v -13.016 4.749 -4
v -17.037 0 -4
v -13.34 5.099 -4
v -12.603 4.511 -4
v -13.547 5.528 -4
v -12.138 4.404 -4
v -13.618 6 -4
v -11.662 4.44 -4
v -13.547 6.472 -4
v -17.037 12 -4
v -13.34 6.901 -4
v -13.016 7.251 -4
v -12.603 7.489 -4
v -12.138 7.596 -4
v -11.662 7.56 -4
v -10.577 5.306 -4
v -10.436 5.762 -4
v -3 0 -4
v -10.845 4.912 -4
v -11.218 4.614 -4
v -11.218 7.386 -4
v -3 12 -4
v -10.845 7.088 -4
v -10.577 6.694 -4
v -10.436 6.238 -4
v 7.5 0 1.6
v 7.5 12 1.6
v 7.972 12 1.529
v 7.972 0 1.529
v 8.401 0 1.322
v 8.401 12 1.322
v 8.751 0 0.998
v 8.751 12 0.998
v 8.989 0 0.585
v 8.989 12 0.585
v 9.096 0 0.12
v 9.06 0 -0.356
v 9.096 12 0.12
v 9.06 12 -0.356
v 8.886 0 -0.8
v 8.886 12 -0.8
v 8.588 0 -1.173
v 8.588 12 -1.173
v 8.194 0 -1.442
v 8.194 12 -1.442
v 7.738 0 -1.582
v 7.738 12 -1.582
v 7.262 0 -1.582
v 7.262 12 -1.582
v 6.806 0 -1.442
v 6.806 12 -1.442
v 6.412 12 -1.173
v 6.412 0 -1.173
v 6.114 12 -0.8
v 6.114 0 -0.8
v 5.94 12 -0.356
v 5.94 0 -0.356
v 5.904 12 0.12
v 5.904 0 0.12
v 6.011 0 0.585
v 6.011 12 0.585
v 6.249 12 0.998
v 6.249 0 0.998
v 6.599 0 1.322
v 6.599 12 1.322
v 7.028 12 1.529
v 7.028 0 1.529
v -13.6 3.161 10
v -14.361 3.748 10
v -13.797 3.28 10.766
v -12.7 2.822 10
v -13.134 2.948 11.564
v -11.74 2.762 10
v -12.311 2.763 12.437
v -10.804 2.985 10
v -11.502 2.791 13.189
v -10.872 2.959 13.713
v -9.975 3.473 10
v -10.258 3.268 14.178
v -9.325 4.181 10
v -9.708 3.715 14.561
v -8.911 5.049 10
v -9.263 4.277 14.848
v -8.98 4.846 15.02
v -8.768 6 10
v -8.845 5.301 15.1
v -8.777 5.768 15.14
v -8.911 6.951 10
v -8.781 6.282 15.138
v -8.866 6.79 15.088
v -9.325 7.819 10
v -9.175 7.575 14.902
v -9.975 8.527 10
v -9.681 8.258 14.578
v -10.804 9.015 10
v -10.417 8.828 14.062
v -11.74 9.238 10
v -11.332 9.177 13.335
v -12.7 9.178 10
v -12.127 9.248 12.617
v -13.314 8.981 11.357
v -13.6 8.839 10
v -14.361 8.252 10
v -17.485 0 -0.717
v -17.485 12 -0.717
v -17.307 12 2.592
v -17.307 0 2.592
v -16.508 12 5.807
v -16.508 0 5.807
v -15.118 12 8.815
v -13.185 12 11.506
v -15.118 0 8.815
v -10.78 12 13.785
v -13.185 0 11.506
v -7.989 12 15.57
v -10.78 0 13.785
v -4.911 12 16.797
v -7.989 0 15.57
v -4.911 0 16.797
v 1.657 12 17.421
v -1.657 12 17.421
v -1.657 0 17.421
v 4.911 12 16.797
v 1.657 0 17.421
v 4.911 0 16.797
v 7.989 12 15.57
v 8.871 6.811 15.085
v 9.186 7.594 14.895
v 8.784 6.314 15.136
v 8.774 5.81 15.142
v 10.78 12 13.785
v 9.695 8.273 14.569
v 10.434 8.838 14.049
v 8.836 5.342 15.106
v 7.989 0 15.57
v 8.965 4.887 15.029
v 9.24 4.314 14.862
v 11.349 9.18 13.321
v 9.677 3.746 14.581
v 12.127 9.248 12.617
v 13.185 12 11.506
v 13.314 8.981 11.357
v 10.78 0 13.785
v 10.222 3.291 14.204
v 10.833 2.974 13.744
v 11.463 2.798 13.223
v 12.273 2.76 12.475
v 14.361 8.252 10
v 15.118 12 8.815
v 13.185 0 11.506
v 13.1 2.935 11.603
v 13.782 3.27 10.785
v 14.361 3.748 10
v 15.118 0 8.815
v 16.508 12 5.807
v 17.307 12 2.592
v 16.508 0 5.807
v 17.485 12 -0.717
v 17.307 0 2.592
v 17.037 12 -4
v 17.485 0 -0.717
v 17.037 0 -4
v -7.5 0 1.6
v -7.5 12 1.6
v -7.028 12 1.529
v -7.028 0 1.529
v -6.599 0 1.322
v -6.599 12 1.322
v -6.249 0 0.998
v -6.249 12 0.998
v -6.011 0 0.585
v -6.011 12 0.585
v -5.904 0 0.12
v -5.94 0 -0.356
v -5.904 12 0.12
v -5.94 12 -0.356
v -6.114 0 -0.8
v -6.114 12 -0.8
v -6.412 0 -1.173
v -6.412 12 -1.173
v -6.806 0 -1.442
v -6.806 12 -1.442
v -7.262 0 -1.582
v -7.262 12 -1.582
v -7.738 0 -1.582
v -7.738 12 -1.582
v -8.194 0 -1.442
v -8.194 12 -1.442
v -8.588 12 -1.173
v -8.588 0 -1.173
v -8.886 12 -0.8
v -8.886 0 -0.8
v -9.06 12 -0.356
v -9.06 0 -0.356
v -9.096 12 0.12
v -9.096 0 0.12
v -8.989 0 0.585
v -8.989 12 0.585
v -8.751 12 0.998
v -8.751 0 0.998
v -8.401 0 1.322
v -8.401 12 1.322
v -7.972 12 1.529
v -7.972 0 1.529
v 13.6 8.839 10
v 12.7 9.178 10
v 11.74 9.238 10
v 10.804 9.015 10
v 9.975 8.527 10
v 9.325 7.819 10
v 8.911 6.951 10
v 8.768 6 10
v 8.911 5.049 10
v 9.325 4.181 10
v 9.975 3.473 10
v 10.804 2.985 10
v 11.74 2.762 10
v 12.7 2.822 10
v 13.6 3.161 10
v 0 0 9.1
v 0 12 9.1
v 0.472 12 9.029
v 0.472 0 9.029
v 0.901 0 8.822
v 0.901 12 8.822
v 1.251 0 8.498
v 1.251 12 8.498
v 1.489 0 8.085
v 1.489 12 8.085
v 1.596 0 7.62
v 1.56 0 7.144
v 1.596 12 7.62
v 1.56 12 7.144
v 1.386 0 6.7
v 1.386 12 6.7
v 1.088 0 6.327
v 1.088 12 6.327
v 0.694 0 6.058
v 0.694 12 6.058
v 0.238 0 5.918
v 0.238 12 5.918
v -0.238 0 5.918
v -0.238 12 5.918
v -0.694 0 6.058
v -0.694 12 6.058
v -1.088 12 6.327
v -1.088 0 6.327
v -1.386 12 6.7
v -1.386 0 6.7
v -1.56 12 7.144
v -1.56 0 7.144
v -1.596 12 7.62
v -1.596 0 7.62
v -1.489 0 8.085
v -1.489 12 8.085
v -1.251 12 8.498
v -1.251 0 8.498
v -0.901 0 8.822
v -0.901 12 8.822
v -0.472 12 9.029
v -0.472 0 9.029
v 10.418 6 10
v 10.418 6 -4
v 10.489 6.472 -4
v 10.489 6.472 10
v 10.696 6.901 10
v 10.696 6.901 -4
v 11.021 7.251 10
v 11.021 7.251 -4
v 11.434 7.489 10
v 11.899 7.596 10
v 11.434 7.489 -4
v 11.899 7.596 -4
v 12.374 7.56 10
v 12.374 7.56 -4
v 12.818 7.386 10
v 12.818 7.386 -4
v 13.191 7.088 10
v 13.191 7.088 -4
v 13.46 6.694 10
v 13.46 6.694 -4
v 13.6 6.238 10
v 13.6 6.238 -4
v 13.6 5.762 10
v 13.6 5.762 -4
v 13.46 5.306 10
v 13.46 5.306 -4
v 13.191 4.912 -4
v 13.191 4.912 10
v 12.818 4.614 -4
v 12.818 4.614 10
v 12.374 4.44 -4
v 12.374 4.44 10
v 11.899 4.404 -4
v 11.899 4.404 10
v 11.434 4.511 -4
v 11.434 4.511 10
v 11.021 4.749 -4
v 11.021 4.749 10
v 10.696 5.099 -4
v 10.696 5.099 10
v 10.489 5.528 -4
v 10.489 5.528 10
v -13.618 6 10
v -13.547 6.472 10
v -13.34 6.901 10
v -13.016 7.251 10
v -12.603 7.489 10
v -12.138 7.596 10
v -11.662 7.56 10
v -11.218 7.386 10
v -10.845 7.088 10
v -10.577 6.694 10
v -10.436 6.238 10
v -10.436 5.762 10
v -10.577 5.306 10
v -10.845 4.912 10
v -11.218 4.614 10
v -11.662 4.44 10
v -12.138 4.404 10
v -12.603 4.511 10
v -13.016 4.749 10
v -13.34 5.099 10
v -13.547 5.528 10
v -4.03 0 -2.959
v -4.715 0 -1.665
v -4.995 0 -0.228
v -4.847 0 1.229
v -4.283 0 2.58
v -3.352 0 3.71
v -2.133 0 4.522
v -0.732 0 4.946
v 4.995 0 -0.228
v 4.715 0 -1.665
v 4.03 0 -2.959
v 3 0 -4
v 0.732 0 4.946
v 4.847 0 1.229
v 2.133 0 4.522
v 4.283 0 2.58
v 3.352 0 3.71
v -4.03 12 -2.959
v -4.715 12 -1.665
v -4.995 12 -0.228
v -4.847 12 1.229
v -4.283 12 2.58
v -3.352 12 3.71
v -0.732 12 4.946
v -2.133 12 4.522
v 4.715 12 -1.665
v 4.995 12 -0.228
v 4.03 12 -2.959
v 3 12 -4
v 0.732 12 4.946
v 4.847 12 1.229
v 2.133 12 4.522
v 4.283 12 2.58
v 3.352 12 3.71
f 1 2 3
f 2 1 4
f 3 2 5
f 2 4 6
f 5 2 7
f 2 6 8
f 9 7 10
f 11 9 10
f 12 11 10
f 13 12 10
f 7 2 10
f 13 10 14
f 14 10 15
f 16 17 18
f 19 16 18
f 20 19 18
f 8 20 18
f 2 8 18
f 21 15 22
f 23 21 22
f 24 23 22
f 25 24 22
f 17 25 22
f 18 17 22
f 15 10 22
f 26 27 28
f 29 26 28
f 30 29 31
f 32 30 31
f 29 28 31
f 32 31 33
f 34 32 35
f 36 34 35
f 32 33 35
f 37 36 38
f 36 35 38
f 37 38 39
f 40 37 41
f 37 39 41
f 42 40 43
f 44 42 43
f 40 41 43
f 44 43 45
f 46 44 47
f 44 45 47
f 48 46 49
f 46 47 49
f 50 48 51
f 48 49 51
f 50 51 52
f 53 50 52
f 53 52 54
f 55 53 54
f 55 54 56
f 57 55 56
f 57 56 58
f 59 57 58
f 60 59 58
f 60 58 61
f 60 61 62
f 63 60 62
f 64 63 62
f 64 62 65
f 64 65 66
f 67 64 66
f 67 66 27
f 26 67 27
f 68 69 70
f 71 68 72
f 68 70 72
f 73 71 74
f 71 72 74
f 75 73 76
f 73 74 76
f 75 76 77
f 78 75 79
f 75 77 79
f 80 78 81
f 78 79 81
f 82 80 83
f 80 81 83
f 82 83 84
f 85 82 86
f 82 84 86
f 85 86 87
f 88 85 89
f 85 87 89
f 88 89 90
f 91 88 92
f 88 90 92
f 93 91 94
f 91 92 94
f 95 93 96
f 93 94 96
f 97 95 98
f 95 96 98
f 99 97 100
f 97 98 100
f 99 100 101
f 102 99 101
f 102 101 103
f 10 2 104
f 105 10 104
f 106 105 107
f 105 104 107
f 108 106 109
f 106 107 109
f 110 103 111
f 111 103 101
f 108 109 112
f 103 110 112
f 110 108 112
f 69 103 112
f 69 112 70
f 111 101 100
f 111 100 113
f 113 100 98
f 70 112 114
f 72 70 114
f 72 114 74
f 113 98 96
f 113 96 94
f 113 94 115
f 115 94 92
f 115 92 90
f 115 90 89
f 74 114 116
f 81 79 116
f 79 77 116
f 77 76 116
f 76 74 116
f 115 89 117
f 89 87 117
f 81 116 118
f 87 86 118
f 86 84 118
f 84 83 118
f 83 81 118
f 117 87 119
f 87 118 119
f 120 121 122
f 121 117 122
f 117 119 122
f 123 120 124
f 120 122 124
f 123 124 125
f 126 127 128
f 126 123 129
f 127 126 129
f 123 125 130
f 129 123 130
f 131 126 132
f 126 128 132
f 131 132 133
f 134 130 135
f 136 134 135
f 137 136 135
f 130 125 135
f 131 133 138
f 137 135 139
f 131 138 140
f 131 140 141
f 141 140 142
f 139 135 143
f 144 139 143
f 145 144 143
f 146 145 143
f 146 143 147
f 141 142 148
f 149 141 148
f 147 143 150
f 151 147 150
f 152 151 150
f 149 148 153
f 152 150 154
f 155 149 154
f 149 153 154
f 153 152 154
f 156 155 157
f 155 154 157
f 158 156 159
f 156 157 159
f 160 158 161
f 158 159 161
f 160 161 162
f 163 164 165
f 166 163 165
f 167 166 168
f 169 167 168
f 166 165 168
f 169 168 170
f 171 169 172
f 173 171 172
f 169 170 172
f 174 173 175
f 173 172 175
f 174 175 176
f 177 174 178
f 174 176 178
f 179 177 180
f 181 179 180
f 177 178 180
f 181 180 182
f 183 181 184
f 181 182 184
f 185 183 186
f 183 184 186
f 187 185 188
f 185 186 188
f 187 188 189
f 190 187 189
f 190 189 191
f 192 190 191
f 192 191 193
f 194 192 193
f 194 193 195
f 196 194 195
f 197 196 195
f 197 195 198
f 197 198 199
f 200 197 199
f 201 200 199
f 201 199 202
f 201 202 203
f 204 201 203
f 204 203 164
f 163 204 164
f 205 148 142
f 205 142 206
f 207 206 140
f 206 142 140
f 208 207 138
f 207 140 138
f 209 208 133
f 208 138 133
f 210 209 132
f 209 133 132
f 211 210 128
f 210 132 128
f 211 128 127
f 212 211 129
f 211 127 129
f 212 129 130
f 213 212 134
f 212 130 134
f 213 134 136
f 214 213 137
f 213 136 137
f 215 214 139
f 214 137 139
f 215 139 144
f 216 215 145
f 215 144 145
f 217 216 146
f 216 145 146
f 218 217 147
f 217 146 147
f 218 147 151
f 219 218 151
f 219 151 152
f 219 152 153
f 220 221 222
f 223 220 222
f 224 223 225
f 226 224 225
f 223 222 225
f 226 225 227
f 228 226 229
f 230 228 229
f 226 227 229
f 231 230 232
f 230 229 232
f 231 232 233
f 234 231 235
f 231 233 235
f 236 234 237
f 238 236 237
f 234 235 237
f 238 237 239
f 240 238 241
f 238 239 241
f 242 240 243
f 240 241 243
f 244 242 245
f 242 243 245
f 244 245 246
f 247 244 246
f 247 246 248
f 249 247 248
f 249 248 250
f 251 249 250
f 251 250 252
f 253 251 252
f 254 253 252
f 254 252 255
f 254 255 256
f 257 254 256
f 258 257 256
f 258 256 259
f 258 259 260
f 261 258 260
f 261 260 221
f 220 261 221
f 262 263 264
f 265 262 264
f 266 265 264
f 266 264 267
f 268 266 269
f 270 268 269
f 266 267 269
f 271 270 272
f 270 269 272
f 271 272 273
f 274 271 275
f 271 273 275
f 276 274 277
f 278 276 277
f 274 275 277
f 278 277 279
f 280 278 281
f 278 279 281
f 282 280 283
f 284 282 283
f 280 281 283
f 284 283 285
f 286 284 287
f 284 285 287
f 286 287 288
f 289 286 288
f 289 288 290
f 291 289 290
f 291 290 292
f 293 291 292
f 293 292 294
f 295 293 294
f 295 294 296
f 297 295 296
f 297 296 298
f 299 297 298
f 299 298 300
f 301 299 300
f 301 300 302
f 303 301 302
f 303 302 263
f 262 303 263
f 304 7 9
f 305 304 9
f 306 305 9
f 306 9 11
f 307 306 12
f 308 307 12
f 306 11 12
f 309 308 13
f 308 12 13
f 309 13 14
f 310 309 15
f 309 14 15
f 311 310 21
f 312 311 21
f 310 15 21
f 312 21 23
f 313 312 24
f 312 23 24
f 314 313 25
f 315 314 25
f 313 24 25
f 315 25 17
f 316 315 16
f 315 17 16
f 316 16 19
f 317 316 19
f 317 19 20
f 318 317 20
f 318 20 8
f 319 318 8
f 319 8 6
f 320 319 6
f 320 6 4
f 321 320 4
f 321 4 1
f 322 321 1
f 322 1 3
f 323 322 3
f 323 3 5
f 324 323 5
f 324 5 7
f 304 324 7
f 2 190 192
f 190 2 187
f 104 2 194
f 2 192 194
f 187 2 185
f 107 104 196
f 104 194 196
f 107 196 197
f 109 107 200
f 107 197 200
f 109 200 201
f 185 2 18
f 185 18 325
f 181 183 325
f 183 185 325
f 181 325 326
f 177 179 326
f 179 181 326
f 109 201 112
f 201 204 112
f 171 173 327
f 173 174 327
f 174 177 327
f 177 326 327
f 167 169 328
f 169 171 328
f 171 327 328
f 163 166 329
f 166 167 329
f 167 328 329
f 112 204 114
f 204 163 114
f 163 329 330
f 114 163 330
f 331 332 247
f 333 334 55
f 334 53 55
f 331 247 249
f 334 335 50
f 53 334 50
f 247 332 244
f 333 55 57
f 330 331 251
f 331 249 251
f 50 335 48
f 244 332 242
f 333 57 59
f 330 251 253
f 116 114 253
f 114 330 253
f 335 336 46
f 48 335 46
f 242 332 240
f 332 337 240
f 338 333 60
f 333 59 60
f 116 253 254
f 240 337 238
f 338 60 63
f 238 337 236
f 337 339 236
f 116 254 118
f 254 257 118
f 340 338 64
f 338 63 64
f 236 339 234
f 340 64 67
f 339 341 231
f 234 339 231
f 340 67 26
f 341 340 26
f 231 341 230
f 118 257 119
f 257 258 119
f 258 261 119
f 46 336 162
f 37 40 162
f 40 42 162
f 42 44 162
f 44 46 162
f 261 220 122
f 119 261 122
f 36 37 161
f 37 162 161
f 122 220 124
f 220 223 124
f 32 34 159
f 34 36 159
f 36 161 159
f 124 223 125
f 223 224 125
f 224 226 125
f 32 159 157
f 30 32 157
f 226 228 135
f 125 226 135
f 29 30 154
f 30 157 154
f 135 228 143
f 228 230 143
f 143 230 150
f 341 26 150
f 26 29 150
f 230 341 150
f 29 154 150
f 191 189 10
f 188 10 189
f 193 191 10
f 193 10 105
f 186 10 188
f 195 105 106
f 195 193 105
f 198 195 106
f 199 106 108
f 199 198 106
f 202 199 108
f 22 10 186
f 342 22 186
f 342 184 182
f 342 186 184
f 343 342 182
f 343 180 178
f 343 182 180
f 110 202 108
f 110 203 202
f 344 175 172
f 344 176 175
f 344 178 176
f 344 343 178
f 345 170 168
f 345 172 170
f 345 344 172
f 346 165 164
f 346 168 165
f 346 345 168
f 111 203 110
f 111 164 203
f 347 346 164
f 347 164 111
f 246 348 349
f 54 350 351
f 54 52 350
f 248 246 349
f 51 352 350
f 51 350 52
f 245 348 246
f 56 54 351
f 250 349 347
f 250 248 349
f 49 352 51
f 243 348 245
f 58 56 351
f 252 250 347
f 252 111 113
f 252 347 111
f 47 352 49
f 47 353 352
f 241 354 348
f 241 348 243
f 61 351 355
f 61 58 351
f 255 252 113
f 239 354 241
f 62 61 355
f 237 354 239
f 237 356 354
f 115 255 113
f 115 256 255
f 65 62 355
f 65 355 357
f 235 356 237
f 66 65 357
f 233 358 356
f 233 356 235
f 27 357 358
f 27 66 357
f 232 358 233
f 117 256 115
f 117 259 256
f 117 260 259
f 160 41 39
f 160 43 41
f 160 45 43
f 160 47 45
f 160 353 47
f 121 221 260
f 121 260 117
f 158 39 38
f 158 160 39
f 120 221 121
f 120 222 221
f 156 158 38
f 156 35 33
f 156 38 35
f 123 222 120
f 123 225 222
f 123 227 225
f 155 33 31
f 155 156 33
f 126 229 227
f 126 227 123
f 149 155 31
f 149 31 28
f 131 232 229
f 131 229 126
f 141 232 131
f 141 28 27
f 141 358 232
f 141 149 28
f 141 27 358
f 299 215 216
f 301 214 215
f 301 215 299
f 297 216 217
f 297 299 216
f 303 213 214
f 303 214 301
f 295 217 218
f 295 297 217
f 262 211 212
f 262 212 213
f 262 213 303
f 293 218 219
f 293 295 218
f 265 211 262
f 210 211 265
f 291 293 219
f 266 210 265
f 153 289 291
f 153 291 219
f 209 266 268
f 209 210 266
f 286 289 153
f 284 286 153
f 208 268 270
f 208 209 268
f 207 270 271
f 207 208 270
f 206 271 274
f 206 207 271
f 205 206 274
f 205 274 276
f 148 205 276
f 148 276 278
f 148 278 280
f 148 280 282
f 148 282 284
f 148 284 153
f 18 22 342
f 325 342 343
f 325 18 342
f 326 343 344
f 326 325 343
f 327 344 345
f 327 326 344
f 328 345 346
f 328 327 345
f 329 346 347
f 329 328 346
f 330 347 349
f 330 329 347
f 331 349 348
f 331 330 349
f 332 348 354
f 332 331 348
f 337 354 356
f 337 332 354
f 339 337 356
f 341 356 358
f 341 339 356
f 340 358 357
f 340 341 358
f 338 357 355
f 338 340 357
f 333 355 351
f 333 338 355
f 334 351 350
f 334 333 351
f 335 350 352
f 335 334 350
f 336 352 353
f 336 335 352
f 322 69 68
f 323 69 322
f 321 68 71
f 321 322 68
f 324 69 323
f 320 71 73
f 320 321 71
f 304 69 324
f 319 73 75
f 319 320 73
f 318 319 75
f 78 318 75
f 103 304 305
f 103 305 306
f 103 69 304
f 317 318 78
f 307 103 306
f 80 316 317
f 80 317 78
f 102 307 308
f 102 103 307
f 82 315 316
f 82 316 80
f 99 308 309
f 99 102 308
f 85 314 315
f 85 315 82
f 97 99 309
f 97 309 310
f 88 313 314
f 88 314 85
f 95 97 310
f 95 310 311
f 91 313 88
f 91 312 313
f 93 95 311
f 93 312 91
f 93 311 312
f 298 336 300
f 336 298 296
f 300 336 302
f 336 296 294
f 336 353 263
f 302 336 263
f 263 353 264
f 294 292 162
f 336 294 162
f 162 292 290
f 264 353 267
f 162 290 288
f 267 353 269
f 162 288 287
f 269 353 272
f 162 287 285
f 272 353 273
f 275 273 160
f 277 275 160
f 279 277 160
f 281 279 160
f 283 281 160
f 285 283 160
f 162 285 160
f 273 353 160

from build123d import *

# Parameters (mm, degrees)
SKETCH1_R               = 17.5
SKETCH1_R_2             = 5
BOSS_EXTRUDE1_DEPTH     = 12
CUT_EXTRUDE1_REACH      = 32.208
SKETCH2_W               = 40
SKETCH2_H               = 15
CUT_EXTRUDE2_REACH      = 32.208
CUT_EXTRUDE2_END_RADIUS = 17.5
SKETCH3_R               = 1.6
SKETCH5_R               = 3.25
CUT_EXTRUDE3_DEPTH      = 7.5
SKETCH8_R               = 1.6
CUT_EXTRUDE4_DEPTH      = 28.50454525


with BuildPart() as part:
    # Sketch1 → Boss-Extrude1 (new body)
    with BuildSketch(Plane(origin=(0, 0, 0), x_dir=(1, 0, 0), z_dir=(0, 1, 0))):
        with Locations(Location((0, 0, 0), (0, 0, 270))):
            Circle(SKETCH1_R)
        with Locations(Location((0, 0, 0), (0, 0, 270))):
            Circle(SKETCH1_R_2, mode=Mode.SUBTRACT)
    extrude(amount=BOSS_EXTRUDE1_DEPTH)

    # Sketch2 → Cut-Extrude1 (cut, up to next)
    with BuildSketch(Plane.XY.offset(-4), mode=Mode.PRIVATE) as cut_extrude1_sk1:
        with Locations((-0.027437806, 7.5)):
            Rectangle(SKETCH2_W, SKETCH2_H)
    cut_extrude1_tool1 = extrude(cut_extrude1_sk1.sketch, amount=-CUT_EXTRUDE1_REACH, mode=Mode.PRIVATE) & part.part
    add(cut_extrude1_tool1.solids().sort_by_distance((-0.027438, 7.5, -4))[0], mode=Mode.SUBTRACT)

    # Cut-Extrude2: up to this cylinder (the profile starts inside it)
    cut_extrude2_end = Plane(origin=(0, 6, 0), z_dir=(0, -1, 0)) * Cylinder(CUT_EXTRUDE2_END_RADIUS, 100.416, mode=Mode.PRIVATE)
    # Sketch3 → Cut-Extrude2 (cut, up to the surface)
    with BuildSketch(Plane(origin=(0, 0, -4), x_dir=(-1, 0, 0), z_dir=(0, 0, -1)), mode=Mode.PRIVATE) as cut_extrude2_sk1:
        with Locations((-12.018362519, 6)):
            Circle(SKETCH3_R)
    cut_extrude2_tool1 = extrude(cut_extrude2_sk1.sketch, amount=-CUT_EXTRUDE2_REACH, mode=Mode.PRIVATE) & cut_extrude2_end
    add(cut_extrude2_tool1.solids().sort_by_distance((12.018363, 6, -4))[0], mode=Mode.SUBTRACT)
    # Sketch3 → Cut-Extrude2 (cut, up to the surface)
    with BuildSketch(Plane(origin=(0, 0, -4), x_dir=(-1, 0, 0), z_dir=(0, 0, -1)), mode=Mode.PRIVATE) as cut_extrude2_sk2:
        with Locations((12.018362519, 6)):
            Circle(SKETCH3_R)
    cut_extrude2_tool2 = extrude(cut_extrude2_sk2.sketch, amount=-CUT_EXTRUDE2_REACH, mode=Mode.PRIVATE) & cut_extrude2_end
    add(cut_extrude2_tool2.solids().sort_by_distance((-12.018363, 6, -4))[0], mode=Mode.SUBTRACT)

    # Sketch5 → Cut-Extrude3 (cut)
    with BuildSketch(Plane.XY.offset(17.5)):
        with Locations((-12.018362519, 6)):
            Circle(SKETCH5_R)
        with Locations((12.018362519, 6)):
            Circle(SKETCH5_R)
    extrude(amount=-CUT_EXTRUDE3_DEPTH, mode=Mode.SUBTRACT)

    # Sketch8 → Cut-Extrude4 (cut, through all)
    with BuildSketch(Plane(origin=(0, 12, 0), x_dir=(1, 0, 0), z_dir=(0, 1, 0))):
        with Locations(Location((-7.5, 0, 0), (0, 0, 270))):
            Circle(SKETCH8_R)
        with Locations(Location((7.5, 0, 0), (0, 0, 270))):
            Circle(SKETCH8_R)
        with Locations(Location((0, -7.5, 0), (0, 0, 270))):
            Circle(SKETCH8_R)
    extrude(amount=-CUT_EXTRUDE4_DEPTH, mode=Mode.SUBTRACT)


solid = part.part
